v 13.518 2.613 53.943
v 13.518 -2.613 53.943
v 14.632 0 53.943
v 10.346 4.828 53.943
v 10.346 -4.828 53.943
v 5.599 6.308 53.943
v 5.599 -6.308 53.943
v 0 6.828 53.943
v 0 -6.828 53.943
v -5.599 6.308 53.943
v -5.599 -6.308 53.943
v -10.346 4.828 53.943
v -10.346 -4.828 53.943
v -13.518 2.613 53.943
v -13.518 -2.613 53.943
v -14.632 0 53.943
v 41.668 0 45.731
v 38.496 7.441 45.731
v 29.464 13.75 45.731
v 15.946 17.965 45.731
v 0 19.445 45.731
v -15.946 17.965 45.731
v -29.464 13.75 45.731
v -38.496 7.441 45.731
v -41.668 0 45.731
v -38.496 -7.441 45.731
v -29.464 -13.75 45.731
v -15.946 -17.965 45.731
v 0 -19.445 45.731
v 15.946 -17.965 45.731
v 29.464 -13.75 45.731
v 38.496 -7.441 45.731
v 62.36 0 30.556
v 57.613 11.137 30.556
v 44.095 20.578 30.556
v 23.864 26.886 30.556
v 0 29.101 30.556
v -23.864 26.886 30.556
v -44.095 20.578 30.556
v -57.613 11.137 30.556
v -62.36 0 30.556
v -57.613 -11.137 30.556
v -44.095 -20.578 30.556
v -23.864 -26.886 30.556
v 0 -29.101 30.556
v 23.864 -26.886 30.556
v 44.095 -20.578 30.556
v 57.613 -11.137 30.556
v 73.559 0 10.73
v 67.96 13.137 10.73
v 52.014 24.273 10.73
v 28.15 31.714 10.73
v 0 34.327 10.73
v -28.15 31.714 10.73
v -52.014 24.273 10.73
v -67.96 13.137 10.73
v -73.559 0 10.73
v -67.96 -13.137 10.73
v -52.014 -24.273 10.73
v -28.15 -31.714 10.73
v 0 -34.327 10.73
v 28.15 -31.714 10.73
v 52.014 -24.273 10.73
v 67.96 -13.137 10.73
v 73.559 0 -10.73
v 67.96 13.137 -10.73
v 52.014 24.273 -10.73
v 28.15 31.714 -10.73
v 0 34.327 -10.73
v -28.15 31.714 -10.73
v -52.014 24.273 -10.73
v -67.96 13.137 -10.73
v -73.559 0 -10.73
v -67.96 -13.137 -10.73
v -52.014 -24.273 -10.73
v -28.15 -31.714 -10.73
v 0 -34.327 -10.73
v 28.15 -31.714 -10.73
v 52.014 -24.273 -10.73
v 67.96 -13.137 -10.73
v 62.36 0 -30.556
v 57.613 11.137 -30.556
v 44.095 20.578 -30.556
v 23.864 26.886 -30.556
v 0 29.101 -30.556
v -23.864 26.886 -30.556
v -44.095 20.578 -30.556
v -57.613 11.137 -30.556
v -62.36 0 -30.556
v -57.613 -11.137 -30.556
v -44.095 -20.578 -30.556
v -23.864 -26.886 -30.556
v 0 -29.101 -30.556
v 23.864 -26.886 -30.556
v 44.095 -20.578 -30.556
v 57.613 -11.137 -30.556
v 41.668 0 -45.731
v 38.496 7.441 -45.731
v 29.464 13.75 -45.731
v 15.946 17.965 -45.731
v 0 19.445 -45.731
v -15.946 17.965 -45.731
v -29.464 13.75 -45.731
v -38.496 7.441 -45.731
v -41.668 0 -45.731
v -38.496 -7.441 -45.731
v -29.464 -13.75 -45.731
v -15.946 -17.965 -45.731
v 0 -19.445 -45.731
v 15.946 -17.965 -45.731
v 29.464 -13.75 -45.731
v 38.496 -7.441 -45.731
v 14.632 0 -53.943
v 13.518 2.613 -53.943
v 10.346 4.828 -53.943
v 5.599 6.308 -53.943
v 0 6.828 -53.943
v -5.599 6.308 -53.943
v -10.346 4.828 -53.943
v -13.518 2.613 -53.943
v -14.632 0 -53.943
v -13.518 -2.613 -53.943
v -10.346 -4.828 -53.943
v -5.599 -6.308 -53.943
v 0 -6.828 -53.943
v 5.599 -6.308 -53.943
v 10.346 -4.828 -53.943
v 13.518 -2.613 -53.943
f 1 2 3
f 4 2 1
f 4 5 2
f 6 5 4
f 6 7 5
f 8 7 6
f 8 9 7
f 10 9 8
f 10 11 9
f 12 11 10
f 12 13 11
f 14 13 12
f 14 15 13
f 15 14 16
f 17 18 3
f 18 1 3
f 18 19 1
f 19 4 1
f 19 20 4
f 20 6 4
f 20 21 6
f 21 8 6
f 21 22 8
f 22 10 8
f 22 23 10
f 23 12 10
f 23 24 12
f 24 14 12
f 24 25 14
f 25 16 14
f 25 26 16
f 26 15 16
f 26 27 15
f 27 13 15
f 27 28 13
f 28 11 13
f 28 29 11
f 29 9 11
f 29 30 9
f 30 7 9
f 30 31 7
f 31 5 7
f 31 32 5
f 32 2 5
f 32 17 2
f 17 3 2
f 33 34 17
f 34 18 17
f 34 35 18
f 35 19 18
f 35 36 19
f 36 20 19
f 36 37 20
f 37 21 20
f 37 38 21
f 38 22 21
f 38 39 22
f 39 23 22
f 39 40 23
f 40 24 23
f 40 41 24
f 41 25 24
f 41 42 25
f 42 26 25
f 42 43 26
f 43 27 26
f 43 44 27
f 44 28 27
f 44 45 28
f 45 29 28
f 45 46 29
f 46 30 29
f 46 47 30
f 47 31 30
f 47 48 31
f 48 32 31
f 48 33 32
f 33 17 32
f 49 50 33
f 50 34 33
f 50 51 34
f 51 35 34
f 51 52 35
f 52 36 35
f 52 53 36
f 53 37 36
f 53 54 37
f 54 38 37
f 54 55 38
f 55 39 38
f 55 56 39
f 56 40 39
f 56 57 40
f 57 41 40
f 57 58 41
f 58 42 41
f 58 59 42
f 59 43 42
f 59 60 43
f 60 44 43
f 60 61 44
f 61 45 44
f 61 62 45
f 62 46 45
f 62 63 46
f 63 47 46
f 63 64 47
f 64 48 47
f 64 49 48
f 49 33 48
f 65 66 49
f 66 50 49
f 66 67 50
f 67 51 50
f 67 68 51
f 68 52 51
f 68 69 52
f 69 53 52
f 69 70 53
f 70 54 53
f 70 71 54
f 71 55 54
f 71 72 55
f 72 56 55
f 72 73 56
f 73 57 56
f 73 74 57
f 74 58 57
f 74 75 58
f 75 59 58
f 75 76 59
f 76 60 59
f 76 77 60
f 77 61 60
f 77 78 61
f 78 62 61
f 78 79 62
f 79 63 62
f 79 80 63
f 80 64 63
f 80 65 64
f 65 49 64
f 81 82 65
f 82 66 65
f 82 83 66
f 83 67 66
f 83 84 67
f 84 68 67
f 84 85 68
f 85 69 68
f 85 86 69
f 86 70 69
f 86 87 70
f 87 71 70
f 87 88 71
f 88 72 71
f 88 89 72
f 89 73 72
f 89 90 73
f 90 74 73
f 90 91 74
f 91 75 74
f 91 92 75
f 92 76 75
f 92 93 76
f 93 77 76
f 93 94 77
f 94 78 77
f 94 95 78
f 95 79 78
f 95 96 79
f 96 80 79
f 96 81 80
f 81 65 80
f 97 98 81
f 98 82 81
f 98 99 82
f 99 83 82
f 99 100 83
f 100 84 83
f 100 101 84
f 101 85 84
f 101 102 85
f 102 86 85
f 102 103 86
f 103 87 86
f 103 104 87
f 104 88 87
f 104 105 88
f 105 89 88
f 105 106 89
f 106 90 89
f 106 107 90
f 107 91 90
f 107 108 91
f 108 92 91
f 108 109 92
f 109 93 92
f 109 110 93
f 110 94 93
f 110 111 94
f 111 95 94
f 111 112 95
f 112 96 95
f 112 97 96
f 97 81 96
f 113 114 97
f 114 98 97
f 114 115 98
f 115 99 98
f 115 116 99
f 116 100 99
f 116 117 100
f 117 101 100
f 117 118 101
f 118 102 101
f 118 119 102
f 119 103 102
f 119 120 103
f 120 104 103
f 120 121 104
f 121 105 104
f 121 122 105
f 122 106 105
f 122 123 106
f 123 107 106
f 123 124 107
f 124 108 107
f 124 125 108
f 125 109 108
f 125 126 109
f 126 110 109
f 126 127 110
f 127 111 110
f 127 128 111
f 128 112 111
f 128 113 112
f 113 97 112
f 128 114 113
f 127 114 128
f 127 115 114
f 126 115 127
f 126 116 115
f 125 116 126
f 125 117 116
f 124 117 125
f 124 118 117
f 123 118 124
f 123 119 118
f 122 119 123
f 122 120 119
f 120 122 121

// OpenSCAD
// Generated by SolidPython 1.0.1 on 2020-07-29 00:46:51


scale(v = [15, 7, 11]) {
	sphere(r = 5);
}
/***********************************************
*********      SolidPython code:      **********
************************************************
 
# import packages: SolidPython
from solid import *
from solid.utils import *
from itertools import chain, combinations, permutations


class Resize:

    def __init__(self, scad_file):
        self.scad_file = scad_file
        #self.scad_file = import_scad(scad_file)
        # cone/cylinder param:
        self.r1 = 0
        self.r2 = 0
        self.h = 0
        # rectangular prism param:
        self.w = 0
        self.l = 0
        # ellipse param:
        self.r = 0

    # import OpenScad code (file name corresponds to shape)


    # classify shape + parameters
    def assign(self, param1, param2, param3):
        if self.scad_file == 'cone.scad':
            self.r1 = param1
            self.r2 = param2
            self.h = param3
        elif self.scad_file == 'cylinder.scad':
            self.r1 = param1
            self.r2 = param2
            self.h = param3
        elif self.scad_file == 'rectangularPrism.scad':
            self.h = param1
            self.l = param2
            self.w = param3
        else:
            self.r = param1
            self.h = param2

    # resize parameters
    def iterate(self):
        x = range(3, 20, 2)
        i = 1
        if self.scad_file == 'cone.scad':
            tempList = list(permutations(x, 2))
            for temp in tempList:
                param1 = temp[0]
                param2 = temp[1]
                filepath = 'produced_scad_files/' + 'cone' + str(param1) + '_' + str(param2) + '_' + '.scad'
                scad_render_to_file(cylinder(h=param1, r1=param2, r2=0), filepath)

        elif self.scad_file == 'cylinder.scad':
            tempList = list(permutations(x, 3))
            for temp in tempList:
                param1 = temp[0]
                param2 = temp[1]
                filepath = 'produced_scad_files/' + 'cylinder' + str(param1) + '_' + str(param2) + '_' + '.scad'
                scad_render_to_file(cylinder(h=param1, r1=param2, r2=param2), filepath)

        elif self.scad_file == 'rectangularPrism.scad':
            tempList = list(permutations(x, 3))
            for temp in tempList:
                param1 = temp[0]
                param2 = temp[1]
                param3 = temp[2]
                filepath = 'produced_scad_files/' + 'rectangularPrism' + str(param1) + '_' + str(param2) + '_' + str(
                    param3) + '.scad'
                scad_render_to_file(cube(size=(param1, param2, param3)), filepath)

        elif self.scad_file == 'ellipse.scad':
            tempList = list(permutations(x, 4))
            for temp in tempList:
                param1 = temp[0]
                param2 = temp[1]
                param3 = temp[2]
                param4 = temp[3]
                filepath = 'produced_scad_files/' + 'ellipse' + str(param1) + '_' + str(param2) + '_' + str(param3) + '_' + str(param4) + '.scad'
                scad_render_to_file(scale([param1, param2, param3])(sphere(r=param4)), filepath)

    def render_to_scadfile(self):
        scad_render_to_file(scad, 'example.scad') 
 
************************************************/
